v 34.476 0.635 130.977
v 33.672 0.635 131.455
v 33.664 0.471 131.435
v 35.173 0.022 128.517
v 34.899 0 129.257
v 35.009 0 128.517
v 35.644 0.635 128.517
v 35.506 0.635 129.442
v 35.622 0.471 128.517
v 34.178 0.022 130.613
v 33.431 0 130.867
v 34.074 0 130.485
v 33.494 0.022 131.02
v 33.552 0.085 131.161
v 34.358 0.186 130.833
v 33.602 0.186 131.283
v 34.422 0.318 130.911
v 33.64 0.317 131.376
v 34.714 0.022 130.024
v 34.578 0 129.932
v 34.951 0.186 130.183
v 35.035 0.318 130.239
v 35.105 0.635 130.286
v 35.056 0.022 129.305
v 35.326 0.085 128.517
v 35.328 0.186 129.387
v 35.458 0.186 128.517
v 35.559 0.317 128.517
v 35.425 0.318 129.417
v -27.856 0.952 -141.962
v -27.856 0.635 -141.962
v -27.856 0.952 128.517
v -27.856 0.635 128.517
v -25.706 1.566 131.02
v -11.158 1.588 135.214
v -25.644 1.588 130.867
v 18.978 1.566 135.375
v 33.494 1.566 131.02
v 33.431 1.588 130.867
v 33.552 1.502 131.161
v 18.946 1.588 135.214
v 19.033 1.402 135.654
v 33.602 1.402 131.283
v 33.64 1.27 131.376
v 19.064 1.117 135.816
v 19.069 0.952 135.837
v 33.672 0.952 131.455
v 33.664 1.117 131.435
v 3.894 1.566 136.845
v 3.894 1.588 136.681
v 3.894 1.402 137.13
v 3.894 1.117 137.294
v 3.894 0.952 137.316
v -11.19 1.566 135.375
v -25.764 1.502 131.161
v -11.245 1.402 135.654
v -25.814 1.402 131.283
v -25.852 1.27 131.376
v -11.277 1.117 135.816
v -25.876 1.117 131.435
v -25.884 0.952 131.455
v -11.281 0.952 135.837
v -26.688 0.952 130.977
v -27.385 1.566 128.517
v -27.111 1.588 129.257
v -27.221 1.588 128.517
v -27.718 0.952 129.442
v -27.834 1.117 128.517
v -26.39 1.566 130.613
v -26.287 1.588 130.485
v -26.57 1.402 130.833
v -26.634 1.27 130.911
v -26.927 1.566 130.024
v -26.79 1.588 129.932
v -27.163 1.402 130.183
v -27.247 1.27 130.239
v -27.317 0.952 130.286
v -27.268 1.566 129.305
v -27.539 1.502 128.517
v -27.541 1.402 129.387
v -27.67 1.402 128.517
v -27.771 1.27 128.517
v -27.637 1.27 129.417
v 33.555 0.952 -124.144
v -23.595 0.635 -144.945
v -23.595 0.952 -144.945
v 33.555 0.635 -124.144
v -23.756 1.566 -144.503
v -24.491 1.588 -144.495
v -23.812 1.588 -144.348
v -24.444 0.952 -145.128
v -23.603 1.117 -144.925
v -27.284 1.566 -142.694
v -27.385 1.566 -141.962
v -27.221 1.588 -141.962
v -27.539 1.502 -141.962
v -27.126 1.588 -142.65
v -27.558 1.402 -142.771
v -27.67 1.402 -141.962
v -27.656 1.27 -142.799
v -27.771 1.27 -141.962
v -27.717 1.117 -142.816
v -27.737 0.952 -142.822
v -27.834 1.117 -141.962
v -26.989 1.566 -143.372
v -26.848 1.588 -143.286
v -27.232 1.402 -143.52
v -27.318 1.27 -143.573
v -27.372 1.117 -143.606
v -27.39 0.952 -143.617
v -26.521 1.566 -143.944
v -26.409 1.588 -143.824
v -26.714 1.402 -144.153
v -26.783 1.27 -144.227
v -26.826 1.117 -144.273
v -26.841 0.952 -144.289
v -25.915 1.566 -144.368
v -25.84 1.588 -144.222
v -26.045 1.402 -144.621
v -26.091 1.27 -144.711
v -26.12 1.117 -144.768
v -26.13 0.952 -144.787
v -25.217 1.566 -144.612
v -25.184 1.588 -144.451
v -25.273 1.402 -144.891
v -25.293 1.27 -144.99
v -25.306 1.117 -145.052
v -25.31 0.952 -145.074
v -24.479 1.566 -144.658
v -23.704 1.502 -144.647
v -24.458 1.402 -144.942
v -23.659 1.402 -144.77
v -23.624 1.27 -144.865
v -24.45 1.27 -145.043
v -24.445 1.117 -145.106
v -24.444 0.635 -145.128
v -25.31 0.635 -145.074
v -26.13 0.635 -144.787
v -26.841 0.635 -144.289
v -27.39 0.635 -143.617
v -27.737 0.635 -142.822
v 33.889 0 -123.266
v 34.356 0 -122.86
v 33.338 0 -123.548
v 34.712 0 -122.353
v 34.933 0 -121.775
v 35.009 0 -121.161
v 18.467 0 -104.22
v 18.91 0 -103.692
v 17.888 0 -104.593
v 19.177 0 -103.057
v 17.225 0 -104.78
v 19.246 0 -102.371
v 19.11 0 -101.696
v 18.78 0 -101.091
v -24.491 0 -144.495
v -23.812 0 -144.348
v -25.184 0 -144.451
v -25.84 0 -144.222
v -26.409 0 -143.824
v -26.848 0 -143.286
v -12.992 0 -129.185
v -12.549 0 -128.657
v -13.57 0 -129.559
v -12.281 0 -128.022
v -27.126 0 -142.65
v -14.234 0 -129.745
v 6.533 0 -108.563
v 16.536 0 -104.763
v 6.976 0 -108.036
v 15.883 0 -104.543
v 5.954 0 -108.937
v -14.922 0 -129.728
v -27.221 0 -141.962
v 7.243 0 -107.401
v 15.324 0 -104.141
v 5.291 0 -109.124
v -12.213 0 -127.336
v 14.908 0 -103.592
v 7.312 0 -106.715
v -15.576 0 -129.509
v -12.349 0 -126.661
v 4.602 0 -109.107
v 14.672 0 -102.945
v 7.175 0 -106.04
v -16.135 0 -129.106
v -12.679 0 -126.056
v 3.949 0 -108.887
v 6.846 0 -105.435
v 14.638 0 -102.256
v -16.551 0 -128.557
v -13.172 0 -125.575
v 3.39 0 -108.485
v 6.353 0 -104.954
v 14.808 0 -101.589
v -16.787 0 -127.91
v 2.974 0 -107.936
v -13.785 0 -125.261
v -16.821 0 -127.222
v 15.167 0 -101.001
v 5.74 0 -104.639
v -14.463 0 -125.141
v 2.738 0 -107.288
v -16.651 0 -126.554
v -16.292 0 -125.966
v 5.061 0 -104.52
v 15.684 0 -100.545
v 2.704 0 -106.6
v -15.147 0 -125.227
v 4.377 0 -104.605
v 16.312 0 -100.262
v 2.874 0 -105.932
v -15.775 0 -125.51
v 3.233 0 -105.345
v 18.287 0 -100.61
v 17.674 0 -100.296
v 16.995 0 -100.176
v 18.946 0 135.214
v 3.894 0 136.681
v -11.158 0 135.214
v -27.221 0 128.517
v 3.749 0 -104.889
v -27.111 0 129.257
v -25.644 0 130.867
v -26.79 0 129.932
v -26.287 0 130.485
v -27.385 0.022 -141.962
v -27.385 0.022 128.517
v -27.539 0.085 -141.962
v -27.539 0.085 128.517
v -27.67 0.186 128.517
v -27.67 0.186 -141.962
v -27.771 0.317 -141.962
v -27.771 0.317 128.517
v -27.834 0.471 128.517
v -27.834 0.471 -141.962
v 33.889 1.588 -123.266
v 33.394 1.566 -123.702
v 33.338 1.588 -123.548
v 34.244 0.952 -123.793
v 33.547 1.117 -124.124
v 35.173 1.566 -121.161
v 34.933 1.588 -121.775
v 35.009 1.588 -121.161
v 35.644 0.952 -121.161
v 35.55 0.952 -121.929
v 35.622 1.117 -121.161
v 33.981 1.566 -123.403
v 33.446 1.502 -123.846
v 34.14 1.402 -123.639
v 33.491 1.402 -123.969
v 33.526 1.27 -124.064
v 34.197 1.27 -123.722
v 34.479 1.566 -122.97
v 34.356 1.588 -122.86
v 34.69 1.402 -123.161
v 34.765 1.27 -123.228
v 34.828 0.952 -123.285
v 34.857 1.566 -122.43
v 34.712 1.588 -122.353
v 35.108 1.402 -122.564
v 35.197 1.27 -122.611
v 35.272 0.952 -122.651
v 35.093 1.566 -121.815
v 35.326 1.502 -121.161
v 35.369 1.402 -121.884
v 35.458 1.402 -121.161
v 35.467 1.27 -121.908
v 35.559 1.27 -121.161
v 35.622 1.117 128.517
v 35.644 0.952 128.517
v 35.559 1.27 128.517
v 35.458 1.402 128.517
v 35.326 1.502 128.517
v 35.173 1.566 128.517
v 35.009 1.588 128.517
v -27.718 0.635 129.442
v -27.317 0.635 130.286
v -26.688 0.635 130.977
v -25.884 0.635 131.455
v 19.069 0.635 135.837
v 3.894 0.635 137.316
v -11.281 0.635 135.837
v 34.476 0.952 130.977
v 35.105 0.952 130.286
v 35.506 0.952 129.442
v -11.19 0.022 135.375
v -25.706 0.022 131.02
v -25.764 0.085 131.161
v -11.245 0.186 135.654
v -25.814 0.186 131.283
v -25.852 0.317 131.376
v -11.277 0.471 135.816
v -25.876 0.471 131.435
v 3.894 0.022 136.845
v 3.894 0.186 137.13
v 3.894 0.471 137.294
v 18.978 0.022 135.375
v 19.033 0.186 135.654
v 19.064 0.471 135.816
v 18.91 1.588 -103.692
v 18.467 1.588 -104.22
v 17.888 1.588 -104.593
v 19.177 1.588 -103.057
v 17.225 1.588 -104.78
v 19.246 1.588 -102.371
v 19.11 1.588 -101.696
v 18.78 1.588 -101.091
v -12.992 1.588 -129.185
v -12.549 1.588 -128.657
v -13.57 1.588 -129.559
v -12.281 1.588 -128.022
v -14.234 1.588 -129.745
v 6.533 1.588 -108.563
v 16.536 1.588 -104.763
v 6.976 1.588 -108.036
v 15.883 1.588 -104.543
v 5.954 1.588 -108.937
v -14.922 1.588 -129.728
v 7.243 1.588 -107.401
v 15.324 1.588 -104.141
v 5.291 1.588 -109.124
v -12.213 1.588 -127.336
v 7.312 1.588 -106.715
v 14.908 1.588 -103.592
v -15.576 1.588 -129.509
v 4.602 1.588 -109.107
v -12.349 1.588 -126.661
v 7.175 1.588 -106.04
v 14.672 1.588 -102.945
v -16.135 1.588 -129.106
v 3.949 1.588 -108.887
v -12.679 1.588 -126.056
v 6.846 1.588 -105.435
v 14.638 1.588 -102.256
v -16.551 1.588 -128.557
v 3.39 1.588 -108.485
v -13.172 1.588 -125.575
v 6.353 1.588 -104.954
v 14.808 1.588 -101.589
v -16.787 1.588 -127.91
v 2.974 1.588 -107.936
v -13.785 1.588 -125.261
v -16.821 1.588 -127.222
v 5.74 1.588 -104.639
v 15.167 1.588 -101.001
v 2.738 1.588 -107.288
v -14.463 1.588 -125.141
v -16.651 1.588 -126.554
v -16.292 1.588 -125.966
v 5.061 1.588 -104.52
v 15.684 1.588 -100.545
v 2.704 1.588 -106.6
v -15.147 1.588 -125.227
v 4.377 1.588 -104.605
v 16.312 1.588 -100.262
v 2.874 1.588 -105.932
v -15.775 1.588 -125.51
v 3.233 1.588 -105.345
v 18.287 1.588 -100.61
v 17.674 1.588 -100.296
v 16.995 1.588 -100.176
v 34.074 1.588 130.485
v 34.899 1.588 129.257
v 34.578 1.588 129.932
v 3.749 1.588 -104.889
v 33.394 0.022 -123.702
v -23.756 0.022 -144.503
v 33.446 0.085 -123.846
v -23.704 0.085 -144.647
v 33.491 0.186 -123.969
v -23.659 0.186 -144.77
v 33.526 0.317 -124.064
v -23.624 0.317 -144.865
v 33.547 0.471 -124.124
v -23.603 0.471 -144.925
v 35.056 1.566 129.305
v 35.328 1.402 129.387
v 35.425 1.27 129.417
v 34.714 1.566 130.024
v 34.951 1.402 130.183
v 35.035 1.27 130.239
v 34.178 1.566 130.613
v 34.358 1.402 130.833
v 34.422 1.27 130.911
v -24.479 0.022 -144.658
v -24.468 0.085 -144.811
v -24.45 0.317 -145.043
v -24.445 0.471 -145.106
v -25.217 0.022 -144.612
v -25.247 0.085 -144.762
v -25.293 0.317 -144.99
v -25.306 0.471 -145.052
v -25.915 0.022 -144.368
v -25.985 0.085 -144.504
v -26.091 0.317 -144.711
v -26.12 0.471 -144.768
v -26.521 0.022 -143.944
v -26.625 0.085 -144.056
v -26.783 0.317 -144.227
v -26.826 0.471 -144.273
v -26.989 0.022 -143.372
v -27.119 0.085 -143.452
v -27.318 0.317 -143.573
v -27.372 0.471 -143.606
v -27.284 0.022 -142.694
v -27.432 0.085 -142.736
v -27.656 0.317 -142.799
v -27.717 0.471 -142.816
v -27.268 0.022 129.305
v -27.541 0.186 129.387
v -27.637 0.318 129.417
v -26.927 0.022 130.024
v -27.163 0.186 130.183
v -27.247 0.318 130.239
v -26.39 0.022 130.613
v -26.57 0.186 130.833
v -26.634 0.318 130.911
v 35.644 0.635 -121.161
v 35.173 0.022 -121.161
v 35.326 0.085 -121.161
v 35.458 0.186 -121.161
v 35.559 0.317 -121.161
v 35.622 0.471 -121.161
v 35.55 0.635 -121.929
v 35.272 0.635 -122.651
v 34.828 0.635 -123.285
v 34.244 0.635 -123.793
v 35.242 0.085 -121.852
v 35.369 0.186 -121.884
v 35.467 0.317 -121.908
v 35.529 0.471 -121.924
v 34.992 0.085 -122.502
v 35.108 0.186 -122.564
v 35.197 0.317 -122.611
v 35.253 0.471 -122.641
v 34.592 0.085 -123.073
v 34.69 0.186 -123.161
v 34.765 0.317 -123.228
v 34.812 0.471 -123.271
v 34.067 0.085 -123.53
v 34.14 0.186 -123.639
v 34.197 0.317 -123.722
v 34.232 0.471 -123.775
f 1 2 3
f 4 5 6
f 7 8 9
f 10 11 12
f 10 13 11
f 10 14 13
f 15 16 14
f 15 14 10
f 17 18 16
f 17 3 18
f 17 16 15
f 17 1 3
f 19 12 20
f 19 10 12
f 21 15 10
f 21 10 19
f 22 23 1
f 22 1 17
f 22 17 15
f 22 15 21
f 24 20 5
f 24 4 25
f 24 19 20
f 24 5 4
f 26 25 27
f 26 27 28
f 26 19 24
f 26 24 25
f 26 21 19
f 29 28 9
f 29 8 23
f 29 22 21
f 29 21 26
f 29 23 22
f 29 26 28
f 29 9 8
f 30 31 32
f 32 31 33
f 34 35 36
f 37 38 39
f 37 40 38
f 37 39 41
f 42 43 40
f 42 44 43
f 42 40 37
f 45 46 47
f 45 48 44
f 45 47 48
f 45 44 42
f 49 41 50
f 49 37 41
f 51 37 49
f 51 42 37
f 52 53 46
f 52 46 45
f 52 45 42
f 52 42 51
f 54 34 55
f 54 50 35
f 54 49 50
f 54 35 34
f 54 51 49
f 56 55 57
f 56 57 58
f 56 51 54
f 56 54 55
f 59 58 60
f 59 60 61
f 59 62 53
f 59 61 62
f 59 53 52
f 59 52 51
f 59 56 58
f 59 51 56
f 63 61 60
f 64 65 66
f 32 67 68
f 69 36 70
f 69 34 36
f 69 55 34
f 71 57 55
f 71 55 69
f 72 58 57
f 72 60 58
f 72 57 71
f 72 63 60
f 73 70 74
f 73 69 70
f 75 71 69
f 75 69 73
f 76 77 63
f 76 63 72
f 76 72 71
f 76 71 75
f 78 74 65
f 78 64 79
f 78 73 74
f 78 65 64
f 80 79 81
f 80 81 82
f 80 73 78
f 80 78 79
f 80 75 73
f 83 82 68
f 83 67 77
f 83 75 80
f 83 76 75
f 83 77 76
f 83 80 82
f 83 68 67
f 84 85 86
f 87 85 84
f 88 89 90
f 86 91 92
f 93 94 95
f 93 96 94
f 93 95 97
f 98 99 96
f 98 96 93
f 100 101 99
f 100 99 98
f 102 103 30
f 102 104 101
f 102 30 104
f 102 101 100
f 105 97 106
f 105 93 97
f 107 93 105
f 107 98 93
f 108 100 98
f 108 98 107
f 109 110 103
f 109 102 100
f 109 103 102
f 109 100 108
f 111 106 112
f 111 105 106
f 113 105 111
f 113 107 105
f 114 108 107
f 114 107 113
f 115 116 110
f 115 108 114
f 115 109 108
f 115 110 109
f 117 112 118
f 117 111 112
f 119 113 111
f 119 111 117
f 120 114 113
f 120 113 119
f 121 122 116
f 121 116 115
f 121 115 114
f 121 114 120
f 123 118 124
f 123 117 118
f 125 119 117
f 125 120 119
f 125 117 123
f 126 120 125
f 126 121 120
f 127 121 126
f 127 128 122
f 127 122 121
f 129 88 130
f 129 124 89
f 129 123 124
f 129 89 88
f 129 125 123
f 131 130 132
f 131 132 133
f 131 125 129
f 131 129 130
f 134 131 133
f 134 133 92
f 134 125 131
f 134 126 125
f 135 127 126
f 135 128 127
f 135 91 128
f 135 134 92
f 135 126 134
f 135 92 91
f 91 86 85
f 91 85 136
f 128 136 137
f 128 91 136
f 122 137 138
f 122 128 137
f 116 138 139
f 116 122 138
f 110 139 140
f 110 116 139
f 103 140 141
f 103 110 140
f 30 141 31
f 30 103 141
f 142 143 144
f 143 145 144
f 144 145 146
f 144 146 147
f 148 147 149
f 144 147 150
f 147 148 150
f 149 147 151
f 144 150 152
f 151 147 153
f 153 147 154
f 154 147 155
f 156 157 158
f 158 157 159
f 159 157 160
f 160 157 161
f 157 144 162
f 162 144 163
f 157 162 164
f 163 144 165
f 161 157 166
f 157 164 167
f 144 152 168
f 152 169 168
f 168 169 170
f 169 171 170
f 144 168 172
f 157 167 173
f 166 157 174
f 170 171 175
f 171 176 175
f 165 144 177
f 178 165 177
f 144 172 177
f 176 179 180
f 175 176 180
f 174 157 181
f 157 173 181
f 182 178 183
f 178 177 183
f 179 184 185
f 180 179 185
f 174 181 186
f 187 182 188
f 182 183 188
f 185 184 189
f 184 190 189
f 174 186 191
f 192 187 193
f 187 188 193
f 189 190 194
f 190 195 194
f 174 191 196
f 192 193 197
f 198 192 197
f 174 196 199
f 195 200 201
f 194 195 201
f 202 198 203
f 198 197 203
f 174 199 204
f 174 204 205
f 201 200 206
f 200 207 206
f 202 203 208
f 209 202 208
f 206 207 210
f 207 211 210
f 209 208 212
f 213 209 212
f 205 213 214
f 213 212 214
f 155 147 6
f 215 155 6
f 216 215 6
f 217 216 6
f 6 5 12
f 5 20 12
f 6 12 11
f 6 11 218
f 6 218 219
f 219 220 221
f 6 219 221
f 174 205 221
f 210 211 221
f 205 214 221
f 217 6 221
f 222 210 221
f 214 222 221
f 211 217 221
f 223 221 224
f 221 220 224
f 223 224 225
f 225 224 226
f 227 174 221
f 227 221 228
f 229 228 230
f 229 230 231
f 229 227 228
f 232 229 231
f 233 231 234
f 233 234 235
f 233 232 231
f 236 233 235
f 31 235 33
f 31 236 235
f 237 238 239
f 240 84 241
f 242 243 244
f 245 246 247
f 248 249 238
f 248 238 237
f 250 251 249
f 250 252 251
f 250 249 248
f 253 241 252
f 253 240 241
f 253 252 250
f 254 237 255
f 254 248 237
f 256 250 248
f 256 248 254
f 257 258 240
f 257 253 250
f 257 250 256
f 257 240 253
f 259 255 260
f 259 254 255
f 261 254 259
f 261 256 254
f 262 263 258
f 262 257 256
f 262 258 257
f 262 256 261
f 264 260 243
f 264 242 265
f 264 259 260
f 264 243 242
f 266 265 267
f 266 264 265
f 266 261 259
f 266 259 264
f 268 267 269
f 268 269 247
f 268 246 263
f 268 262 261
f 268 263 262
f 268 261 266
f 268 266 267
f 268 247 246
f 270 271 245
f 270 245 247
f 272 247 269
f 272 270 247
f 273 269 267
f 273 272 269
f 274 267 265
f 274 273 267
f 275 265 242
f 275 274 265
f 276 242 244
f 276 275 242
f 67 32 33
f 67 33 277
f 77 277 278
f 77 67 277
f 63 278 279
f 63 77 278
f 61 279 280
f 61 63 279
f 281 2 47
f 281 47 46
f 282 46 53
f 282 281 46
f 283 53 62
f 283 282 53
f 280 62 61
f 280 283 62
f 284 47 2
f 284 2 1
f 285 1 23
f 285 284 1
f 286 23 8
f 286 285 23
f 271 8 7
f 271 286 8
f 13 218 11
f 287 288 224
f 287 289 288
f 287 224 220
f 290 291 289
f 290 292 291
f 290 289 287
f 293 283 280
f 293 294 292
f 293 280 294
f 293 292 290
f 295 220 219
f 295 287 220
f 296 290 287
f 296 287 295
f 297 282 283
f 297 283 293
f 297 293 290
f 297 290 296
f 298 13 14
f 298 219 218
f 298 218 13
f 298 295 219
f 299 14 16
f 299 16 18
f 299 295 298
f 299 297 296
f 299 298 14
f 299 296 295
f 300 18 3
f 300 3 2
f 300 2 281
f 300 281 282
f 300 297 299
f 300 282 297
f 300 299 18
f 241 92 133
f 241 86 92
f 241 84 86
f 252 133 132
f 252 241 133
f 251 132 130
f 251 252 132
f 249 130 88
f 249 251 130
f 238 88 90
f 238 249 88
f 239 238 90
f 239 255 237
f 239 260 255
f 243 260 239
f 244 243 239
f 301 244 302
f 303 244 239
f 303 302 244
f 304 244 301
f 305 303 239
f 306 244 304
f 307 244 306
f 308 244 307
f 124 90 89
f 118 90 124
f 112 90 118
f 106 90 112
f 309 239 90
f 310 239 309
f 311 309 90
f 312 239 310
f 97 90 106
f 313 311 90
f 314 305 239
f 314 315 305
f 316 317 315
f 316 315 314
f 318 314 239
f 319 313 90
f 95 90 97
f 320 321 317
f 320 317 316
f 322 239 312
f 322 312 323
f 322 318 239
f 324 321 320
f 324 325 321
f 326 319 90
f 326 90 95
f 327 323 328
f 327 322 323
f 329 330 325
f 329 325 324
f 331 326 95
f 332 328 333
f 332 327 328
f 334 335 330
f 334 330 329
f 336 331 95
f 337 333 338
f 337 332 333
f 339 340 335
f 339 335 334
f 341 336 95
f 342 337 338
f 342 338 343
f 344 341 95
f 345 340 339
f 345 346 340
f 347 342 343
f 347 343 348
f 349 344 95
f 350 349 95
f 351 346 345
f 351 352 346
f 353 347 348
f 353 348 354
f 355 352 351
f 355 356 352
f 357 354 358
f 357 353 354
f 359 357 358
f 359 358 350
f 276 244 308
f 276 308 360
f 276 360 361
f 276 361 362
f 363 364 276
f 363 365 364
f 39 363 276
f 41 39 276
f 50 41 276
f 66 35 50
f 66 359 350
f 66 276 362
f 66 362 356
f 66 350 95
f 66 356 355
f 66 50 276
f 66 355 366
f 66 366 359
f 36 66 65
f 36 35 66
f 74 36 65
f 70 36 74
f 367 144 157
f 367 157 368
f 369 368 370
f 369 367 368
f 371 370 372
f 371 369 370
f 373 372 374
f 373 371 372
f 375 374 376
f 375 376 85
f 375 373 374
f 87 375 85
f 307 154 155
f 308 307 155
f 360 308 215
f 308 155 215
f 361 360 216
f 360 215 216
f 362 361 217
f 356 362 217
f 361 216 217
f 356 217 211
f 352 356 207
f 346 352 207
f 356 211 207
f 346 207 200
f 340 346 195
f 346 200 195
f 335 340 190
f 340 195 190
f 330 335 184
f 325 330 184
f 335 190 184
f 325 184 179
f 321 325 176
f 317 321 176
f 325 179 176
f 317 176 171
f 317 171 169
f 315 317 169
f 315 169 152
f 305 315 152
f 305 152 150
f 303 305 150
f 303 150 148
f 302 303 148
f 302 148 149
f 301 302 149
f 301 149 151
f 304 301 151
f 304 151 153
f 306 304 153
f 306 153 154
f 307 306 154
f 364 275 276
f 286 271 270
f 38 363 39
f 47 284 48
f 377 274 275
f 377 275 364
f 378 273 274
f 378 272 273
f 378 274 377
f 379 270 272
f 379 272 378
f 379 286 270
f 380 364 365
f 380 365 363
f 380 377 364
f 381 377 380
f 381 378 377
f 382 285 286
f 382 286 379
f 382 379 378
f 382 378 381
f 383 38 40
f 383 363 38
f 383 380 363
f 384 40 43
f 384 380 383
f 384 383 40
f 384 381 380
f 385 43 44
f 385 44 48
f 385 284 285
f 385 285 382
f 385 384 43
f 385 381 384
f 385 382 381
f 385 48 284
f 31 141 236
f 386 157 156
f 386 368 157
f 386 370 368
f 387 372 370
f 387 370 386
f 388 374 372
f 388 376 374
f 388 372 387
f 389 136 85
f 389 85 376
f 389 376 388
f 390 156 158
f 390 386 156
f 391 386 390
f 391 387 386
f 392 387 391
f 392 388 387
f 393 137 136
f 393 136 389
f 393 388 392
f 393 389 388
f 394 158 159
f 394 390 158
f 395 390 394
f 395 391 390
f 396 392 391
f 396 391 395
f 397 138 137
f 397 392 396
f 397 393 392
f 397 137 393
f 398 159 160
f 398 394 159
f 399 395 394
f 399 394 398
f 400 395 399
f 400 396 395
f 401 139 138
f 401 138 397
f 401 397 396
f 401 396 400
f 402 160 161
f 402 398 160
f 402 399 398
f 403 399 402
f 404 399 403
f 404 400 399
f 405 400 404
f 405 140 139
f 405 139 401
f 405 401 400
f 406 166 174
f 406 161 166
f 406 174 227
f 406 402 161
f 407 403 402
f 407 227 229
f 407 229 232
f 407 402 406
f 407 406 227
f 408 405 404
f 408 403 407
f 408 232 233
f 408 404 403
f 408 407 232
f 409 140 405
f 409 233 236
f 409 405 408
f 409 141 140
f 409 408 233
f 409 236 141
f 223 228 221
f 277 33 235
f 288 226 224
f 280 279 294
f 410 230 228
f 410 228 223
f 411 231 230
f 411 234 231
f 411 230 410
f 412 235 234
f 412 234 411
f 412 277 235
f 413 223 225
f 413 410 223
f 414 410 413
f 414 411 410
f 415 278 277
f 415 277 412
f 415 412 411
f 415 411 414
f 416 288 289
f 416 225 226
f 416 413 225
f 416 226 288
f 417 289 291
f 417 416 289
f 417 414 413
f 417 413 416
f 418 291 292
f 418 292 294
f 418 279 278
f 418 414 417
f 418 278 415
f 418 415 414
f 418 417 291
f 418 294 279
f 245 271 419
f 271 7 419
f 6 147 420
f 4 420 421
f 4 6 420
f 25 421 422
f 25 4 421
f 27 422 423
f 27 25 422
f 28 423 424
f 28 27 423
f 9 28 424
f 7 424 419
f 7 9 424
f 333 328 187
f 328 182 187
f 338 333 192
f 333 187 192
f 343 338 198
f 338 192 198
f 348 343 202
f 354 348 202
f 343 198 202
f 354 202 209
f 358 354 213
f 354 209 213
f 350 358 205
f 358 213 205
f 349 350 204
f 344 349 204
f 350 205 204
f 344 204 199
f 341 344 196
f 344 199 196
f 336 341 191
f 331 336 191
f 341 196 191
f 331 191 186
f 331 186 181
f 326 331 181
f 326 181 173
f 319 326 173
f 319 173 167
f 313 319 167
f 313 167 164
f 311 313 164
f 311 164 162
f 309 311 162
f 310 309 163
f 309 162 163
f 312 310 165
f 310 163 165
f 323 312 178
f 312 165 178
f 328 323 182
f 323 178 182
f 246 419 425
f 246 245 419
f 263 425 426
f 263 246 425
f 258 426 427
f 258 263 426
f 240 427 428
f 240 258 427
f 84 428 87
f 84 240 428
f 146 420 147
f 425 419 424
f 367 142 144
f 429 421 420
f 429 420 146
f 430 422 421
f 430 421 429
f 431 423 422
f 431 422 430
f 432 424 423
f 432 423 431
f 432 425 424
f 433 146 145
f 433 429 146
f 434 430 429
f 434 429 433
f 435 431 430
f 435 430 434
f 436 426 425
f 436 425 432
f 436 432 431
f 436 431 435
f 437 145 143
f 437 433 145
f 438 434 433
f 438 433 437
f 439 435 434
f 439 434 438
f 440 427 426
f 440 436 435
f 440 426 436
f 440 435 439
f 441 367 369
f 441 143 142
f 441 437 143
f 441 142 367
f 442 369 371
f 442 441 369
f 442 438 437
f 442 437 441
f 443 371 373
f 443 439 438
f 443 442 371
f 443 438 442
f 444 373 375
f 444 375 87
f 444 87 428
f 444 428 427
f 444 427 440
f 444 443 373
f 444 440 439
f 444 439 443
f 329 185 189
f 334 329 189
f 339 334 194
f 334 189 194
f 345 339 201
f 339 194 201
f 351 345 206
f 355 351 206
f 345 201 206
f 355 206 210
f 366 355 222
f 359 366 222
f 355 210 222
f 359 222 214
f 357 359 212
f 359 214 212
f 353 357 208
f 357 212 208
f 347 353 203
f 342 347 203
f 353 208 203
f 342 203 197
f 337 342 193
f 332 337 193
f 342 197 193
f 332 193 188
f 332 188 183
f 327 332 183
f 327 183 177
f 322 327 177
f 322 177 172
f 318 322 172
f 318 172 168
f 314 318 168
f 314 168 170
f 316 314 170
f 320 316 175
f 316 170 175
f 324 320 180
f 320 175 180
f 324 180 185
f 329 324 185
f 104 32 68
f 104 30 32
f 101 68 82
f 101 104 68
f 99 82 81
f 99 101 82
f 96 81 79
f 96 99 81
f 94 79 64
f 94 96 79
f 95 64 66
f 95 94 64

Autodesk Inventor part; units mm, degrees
ref_plane "YZ Plane" through (0, 0, 0) normal (1, 0, 0) x (0, 1, 0)
ref_plane "XZ Plane" through (0, 0, 0) normal (0, 1, 0) x (-1, 0, 0)
ref_plane "XY Plane" through (0, 0, 0) normal (0, 0, 1) x (1, 0, 0)
sketch "Sketch1" plane through (0, 0, 0) normal (0, 1, 0) x (-1, 0, 0)
  line L0 (27.8561, -123.3839) -> (27.8561, 130.6161)
  line L1 (27.8561, 130.6161) -> (-35.6439, 130.6161) construction
  line L2 (-35.6439, 130.6161) -> (-35.6439, -123.3839)
  line L3 (27.8561, -146.496) -> (-35.6439, -123.3839)
  line L4 (27.8561, -146.496) -> (27.8561, -123.3839)
  arc A0 (27.8561, 130.6161) -> (-35.6439, 130.6161) centre (-3.8939, 58.7362) ccw
  line L5 (-35.6439, -123.3839) -> (-3.8939, -52.0908)
  point P0 (0, 0)
  dimension "d3" = 254
  dimension "d4" = 110
  dimension "d6" = 78.5798
  dimension "d24" = 24.006
extrude "Extrusion1" add sketch "Sketch1" along normal blind 1.5875
fillet "Fillet1" radius 3.175 4 edges at (-27.8561, 0.7937, -146.496) (35.6439, 0.7937, -123.3839) (35.6439, 0.7937, 130.6161) (-27.8561, 0.7937, 130.6161)
fillet "Fillet2" radius 0.635 16 edges at (-27.3175, 1.5875, 130.2862) (3.8939, 1.5875, 137.316) (35.1052, 1.5875, 130.2862) (35.6439, 1.5875, 3.6781) (35.0697, 1.5875, -122.9818) (4.9798, 1.5875, -134.5447) (-26.5022, 1.5875, -144.5624) (-27.8561, 1.5875, 2.5665) (-26.5022, 0, -144.5624) (4.9798, 0, -134.5447) (35.0697, 0, -122.9818) (35.6439, 0, 3.6781) (35.1052, 0, 130.2862) (3.8939, 0, 137.316) (-27.3175, 0, 130.2862) (-27.8561, 0, 2.5665)
sketch "Sketch3" plane through (0, 0, 0) normal (0, -1, 0) x (1, 0, 0)
  circle A0 centre (10.8789, -105.1316) radius 2.3114 projected
  circle A1 centre (-14.5211, -117.8316) radius 2.3114 projected
  circle A2 centre (23.5789, -105.1316) radius 2.3114 projected
  arc A3 (-27.2211, -141.9616) -> (-23.8124, -144.3485) centre (-24.6811, -141.9616) ccw projected
  line L0 (33.3376, -123.5476) -> (-23.8124, -144.3485) projected
  arc A4 (33.3376, -123.5476) -> (35.0089, -121.1607) centre (32.4689, -121.1607) ccw projected
  line L1 (35.0089, 128.5169) -> (35.0089, -121.1607) projected
  arc A5 (35.0089, 128.5169) -> (33.4314, 130.8675) centre (32.4689, 128.5169) ccw projected
  arc A6 (33.4314, 130.8675) -> (-25.6437, 130.8675) centre (3.8939, 58.7362) ccw projected
  arc A7 (-25.6437, 130.8675) -> (-27.2211, 128.5169) centre (-24.6811, 128.5169) ccw projected
  line L2 (-27.2211, -141.9616) -> (-27.2211, 128.5169) projected
  line L3 (32.4689, -121.1607) -> (15.1752, -73.6466)
  point P0 (0, 0)
  dimension "d39" = 20
sketch "Sketch4" plane through (0, 0, 0) normal (0, -1, 0) x (0.9397, 0, 0.342)
  line L0 (-10.9286, -127.4989) -> (-71.7464, -127.4989) projected
  line L1 (-74.1332, -124.0901) -> (18.3759, 130.0766) projected
  circle A0 centre (-57.2364, -114.7989) radius 2.3114
  line L2 (-10.9286, -124.9589) -> (-10.9286, -74.3954) construction
  line L3 (-10.9286, -124.9589) -> (-35.7001, -124.9589) construction
  circle A1 centre (-57.2364, -102.0989) radius 2.3114
  circle A2 centre (-57.2364, -89.3989) radius 2.3114
  circle A3 centre (-44.5364, -114.7989) radius 2.3114
  circle A4 centre (-44.5364, -102.0989) radius 2.3114
  circle A5 centre (-44.5364, -89.3989) radius 2.3114
  circle A6 centre (-31.8364, -114.7989) radius 2.3114
  circle A7 centre (-31.8364, -102.0989) radius 2.3114
  circle A8 centre (-31.8364, -89.3989) radius 2.3114
  circle A9 centre (-19.1364, -114.7989) radius 2.3114
  circle A10 centre (-19.1364, -102.0989) radius 2.3114
  circle A11 centre (-19.1364, -89.3989) radius 2.3114
  circle A12 centre (-6.4364, -114.7989) radius 2.3114
  circle A13 centre (-6.4364, -102.0989) radius 2.3114
  circle A14 centre (-6.4364, -89.3989) radius 2.3114
  point P0 (0, 0)
  dimension "d26" = 4.6228
  dimension "d27" = 12.7
  dimension "d28" = 12.7
  dimension "d31" = 12.7
  dimension "d34" = 12.7
extrude "Extrusion3" cut sketch "Sketch4" against normal blind 25.4 contours A0 | A7 | A10
properties part number "large ball holder"
